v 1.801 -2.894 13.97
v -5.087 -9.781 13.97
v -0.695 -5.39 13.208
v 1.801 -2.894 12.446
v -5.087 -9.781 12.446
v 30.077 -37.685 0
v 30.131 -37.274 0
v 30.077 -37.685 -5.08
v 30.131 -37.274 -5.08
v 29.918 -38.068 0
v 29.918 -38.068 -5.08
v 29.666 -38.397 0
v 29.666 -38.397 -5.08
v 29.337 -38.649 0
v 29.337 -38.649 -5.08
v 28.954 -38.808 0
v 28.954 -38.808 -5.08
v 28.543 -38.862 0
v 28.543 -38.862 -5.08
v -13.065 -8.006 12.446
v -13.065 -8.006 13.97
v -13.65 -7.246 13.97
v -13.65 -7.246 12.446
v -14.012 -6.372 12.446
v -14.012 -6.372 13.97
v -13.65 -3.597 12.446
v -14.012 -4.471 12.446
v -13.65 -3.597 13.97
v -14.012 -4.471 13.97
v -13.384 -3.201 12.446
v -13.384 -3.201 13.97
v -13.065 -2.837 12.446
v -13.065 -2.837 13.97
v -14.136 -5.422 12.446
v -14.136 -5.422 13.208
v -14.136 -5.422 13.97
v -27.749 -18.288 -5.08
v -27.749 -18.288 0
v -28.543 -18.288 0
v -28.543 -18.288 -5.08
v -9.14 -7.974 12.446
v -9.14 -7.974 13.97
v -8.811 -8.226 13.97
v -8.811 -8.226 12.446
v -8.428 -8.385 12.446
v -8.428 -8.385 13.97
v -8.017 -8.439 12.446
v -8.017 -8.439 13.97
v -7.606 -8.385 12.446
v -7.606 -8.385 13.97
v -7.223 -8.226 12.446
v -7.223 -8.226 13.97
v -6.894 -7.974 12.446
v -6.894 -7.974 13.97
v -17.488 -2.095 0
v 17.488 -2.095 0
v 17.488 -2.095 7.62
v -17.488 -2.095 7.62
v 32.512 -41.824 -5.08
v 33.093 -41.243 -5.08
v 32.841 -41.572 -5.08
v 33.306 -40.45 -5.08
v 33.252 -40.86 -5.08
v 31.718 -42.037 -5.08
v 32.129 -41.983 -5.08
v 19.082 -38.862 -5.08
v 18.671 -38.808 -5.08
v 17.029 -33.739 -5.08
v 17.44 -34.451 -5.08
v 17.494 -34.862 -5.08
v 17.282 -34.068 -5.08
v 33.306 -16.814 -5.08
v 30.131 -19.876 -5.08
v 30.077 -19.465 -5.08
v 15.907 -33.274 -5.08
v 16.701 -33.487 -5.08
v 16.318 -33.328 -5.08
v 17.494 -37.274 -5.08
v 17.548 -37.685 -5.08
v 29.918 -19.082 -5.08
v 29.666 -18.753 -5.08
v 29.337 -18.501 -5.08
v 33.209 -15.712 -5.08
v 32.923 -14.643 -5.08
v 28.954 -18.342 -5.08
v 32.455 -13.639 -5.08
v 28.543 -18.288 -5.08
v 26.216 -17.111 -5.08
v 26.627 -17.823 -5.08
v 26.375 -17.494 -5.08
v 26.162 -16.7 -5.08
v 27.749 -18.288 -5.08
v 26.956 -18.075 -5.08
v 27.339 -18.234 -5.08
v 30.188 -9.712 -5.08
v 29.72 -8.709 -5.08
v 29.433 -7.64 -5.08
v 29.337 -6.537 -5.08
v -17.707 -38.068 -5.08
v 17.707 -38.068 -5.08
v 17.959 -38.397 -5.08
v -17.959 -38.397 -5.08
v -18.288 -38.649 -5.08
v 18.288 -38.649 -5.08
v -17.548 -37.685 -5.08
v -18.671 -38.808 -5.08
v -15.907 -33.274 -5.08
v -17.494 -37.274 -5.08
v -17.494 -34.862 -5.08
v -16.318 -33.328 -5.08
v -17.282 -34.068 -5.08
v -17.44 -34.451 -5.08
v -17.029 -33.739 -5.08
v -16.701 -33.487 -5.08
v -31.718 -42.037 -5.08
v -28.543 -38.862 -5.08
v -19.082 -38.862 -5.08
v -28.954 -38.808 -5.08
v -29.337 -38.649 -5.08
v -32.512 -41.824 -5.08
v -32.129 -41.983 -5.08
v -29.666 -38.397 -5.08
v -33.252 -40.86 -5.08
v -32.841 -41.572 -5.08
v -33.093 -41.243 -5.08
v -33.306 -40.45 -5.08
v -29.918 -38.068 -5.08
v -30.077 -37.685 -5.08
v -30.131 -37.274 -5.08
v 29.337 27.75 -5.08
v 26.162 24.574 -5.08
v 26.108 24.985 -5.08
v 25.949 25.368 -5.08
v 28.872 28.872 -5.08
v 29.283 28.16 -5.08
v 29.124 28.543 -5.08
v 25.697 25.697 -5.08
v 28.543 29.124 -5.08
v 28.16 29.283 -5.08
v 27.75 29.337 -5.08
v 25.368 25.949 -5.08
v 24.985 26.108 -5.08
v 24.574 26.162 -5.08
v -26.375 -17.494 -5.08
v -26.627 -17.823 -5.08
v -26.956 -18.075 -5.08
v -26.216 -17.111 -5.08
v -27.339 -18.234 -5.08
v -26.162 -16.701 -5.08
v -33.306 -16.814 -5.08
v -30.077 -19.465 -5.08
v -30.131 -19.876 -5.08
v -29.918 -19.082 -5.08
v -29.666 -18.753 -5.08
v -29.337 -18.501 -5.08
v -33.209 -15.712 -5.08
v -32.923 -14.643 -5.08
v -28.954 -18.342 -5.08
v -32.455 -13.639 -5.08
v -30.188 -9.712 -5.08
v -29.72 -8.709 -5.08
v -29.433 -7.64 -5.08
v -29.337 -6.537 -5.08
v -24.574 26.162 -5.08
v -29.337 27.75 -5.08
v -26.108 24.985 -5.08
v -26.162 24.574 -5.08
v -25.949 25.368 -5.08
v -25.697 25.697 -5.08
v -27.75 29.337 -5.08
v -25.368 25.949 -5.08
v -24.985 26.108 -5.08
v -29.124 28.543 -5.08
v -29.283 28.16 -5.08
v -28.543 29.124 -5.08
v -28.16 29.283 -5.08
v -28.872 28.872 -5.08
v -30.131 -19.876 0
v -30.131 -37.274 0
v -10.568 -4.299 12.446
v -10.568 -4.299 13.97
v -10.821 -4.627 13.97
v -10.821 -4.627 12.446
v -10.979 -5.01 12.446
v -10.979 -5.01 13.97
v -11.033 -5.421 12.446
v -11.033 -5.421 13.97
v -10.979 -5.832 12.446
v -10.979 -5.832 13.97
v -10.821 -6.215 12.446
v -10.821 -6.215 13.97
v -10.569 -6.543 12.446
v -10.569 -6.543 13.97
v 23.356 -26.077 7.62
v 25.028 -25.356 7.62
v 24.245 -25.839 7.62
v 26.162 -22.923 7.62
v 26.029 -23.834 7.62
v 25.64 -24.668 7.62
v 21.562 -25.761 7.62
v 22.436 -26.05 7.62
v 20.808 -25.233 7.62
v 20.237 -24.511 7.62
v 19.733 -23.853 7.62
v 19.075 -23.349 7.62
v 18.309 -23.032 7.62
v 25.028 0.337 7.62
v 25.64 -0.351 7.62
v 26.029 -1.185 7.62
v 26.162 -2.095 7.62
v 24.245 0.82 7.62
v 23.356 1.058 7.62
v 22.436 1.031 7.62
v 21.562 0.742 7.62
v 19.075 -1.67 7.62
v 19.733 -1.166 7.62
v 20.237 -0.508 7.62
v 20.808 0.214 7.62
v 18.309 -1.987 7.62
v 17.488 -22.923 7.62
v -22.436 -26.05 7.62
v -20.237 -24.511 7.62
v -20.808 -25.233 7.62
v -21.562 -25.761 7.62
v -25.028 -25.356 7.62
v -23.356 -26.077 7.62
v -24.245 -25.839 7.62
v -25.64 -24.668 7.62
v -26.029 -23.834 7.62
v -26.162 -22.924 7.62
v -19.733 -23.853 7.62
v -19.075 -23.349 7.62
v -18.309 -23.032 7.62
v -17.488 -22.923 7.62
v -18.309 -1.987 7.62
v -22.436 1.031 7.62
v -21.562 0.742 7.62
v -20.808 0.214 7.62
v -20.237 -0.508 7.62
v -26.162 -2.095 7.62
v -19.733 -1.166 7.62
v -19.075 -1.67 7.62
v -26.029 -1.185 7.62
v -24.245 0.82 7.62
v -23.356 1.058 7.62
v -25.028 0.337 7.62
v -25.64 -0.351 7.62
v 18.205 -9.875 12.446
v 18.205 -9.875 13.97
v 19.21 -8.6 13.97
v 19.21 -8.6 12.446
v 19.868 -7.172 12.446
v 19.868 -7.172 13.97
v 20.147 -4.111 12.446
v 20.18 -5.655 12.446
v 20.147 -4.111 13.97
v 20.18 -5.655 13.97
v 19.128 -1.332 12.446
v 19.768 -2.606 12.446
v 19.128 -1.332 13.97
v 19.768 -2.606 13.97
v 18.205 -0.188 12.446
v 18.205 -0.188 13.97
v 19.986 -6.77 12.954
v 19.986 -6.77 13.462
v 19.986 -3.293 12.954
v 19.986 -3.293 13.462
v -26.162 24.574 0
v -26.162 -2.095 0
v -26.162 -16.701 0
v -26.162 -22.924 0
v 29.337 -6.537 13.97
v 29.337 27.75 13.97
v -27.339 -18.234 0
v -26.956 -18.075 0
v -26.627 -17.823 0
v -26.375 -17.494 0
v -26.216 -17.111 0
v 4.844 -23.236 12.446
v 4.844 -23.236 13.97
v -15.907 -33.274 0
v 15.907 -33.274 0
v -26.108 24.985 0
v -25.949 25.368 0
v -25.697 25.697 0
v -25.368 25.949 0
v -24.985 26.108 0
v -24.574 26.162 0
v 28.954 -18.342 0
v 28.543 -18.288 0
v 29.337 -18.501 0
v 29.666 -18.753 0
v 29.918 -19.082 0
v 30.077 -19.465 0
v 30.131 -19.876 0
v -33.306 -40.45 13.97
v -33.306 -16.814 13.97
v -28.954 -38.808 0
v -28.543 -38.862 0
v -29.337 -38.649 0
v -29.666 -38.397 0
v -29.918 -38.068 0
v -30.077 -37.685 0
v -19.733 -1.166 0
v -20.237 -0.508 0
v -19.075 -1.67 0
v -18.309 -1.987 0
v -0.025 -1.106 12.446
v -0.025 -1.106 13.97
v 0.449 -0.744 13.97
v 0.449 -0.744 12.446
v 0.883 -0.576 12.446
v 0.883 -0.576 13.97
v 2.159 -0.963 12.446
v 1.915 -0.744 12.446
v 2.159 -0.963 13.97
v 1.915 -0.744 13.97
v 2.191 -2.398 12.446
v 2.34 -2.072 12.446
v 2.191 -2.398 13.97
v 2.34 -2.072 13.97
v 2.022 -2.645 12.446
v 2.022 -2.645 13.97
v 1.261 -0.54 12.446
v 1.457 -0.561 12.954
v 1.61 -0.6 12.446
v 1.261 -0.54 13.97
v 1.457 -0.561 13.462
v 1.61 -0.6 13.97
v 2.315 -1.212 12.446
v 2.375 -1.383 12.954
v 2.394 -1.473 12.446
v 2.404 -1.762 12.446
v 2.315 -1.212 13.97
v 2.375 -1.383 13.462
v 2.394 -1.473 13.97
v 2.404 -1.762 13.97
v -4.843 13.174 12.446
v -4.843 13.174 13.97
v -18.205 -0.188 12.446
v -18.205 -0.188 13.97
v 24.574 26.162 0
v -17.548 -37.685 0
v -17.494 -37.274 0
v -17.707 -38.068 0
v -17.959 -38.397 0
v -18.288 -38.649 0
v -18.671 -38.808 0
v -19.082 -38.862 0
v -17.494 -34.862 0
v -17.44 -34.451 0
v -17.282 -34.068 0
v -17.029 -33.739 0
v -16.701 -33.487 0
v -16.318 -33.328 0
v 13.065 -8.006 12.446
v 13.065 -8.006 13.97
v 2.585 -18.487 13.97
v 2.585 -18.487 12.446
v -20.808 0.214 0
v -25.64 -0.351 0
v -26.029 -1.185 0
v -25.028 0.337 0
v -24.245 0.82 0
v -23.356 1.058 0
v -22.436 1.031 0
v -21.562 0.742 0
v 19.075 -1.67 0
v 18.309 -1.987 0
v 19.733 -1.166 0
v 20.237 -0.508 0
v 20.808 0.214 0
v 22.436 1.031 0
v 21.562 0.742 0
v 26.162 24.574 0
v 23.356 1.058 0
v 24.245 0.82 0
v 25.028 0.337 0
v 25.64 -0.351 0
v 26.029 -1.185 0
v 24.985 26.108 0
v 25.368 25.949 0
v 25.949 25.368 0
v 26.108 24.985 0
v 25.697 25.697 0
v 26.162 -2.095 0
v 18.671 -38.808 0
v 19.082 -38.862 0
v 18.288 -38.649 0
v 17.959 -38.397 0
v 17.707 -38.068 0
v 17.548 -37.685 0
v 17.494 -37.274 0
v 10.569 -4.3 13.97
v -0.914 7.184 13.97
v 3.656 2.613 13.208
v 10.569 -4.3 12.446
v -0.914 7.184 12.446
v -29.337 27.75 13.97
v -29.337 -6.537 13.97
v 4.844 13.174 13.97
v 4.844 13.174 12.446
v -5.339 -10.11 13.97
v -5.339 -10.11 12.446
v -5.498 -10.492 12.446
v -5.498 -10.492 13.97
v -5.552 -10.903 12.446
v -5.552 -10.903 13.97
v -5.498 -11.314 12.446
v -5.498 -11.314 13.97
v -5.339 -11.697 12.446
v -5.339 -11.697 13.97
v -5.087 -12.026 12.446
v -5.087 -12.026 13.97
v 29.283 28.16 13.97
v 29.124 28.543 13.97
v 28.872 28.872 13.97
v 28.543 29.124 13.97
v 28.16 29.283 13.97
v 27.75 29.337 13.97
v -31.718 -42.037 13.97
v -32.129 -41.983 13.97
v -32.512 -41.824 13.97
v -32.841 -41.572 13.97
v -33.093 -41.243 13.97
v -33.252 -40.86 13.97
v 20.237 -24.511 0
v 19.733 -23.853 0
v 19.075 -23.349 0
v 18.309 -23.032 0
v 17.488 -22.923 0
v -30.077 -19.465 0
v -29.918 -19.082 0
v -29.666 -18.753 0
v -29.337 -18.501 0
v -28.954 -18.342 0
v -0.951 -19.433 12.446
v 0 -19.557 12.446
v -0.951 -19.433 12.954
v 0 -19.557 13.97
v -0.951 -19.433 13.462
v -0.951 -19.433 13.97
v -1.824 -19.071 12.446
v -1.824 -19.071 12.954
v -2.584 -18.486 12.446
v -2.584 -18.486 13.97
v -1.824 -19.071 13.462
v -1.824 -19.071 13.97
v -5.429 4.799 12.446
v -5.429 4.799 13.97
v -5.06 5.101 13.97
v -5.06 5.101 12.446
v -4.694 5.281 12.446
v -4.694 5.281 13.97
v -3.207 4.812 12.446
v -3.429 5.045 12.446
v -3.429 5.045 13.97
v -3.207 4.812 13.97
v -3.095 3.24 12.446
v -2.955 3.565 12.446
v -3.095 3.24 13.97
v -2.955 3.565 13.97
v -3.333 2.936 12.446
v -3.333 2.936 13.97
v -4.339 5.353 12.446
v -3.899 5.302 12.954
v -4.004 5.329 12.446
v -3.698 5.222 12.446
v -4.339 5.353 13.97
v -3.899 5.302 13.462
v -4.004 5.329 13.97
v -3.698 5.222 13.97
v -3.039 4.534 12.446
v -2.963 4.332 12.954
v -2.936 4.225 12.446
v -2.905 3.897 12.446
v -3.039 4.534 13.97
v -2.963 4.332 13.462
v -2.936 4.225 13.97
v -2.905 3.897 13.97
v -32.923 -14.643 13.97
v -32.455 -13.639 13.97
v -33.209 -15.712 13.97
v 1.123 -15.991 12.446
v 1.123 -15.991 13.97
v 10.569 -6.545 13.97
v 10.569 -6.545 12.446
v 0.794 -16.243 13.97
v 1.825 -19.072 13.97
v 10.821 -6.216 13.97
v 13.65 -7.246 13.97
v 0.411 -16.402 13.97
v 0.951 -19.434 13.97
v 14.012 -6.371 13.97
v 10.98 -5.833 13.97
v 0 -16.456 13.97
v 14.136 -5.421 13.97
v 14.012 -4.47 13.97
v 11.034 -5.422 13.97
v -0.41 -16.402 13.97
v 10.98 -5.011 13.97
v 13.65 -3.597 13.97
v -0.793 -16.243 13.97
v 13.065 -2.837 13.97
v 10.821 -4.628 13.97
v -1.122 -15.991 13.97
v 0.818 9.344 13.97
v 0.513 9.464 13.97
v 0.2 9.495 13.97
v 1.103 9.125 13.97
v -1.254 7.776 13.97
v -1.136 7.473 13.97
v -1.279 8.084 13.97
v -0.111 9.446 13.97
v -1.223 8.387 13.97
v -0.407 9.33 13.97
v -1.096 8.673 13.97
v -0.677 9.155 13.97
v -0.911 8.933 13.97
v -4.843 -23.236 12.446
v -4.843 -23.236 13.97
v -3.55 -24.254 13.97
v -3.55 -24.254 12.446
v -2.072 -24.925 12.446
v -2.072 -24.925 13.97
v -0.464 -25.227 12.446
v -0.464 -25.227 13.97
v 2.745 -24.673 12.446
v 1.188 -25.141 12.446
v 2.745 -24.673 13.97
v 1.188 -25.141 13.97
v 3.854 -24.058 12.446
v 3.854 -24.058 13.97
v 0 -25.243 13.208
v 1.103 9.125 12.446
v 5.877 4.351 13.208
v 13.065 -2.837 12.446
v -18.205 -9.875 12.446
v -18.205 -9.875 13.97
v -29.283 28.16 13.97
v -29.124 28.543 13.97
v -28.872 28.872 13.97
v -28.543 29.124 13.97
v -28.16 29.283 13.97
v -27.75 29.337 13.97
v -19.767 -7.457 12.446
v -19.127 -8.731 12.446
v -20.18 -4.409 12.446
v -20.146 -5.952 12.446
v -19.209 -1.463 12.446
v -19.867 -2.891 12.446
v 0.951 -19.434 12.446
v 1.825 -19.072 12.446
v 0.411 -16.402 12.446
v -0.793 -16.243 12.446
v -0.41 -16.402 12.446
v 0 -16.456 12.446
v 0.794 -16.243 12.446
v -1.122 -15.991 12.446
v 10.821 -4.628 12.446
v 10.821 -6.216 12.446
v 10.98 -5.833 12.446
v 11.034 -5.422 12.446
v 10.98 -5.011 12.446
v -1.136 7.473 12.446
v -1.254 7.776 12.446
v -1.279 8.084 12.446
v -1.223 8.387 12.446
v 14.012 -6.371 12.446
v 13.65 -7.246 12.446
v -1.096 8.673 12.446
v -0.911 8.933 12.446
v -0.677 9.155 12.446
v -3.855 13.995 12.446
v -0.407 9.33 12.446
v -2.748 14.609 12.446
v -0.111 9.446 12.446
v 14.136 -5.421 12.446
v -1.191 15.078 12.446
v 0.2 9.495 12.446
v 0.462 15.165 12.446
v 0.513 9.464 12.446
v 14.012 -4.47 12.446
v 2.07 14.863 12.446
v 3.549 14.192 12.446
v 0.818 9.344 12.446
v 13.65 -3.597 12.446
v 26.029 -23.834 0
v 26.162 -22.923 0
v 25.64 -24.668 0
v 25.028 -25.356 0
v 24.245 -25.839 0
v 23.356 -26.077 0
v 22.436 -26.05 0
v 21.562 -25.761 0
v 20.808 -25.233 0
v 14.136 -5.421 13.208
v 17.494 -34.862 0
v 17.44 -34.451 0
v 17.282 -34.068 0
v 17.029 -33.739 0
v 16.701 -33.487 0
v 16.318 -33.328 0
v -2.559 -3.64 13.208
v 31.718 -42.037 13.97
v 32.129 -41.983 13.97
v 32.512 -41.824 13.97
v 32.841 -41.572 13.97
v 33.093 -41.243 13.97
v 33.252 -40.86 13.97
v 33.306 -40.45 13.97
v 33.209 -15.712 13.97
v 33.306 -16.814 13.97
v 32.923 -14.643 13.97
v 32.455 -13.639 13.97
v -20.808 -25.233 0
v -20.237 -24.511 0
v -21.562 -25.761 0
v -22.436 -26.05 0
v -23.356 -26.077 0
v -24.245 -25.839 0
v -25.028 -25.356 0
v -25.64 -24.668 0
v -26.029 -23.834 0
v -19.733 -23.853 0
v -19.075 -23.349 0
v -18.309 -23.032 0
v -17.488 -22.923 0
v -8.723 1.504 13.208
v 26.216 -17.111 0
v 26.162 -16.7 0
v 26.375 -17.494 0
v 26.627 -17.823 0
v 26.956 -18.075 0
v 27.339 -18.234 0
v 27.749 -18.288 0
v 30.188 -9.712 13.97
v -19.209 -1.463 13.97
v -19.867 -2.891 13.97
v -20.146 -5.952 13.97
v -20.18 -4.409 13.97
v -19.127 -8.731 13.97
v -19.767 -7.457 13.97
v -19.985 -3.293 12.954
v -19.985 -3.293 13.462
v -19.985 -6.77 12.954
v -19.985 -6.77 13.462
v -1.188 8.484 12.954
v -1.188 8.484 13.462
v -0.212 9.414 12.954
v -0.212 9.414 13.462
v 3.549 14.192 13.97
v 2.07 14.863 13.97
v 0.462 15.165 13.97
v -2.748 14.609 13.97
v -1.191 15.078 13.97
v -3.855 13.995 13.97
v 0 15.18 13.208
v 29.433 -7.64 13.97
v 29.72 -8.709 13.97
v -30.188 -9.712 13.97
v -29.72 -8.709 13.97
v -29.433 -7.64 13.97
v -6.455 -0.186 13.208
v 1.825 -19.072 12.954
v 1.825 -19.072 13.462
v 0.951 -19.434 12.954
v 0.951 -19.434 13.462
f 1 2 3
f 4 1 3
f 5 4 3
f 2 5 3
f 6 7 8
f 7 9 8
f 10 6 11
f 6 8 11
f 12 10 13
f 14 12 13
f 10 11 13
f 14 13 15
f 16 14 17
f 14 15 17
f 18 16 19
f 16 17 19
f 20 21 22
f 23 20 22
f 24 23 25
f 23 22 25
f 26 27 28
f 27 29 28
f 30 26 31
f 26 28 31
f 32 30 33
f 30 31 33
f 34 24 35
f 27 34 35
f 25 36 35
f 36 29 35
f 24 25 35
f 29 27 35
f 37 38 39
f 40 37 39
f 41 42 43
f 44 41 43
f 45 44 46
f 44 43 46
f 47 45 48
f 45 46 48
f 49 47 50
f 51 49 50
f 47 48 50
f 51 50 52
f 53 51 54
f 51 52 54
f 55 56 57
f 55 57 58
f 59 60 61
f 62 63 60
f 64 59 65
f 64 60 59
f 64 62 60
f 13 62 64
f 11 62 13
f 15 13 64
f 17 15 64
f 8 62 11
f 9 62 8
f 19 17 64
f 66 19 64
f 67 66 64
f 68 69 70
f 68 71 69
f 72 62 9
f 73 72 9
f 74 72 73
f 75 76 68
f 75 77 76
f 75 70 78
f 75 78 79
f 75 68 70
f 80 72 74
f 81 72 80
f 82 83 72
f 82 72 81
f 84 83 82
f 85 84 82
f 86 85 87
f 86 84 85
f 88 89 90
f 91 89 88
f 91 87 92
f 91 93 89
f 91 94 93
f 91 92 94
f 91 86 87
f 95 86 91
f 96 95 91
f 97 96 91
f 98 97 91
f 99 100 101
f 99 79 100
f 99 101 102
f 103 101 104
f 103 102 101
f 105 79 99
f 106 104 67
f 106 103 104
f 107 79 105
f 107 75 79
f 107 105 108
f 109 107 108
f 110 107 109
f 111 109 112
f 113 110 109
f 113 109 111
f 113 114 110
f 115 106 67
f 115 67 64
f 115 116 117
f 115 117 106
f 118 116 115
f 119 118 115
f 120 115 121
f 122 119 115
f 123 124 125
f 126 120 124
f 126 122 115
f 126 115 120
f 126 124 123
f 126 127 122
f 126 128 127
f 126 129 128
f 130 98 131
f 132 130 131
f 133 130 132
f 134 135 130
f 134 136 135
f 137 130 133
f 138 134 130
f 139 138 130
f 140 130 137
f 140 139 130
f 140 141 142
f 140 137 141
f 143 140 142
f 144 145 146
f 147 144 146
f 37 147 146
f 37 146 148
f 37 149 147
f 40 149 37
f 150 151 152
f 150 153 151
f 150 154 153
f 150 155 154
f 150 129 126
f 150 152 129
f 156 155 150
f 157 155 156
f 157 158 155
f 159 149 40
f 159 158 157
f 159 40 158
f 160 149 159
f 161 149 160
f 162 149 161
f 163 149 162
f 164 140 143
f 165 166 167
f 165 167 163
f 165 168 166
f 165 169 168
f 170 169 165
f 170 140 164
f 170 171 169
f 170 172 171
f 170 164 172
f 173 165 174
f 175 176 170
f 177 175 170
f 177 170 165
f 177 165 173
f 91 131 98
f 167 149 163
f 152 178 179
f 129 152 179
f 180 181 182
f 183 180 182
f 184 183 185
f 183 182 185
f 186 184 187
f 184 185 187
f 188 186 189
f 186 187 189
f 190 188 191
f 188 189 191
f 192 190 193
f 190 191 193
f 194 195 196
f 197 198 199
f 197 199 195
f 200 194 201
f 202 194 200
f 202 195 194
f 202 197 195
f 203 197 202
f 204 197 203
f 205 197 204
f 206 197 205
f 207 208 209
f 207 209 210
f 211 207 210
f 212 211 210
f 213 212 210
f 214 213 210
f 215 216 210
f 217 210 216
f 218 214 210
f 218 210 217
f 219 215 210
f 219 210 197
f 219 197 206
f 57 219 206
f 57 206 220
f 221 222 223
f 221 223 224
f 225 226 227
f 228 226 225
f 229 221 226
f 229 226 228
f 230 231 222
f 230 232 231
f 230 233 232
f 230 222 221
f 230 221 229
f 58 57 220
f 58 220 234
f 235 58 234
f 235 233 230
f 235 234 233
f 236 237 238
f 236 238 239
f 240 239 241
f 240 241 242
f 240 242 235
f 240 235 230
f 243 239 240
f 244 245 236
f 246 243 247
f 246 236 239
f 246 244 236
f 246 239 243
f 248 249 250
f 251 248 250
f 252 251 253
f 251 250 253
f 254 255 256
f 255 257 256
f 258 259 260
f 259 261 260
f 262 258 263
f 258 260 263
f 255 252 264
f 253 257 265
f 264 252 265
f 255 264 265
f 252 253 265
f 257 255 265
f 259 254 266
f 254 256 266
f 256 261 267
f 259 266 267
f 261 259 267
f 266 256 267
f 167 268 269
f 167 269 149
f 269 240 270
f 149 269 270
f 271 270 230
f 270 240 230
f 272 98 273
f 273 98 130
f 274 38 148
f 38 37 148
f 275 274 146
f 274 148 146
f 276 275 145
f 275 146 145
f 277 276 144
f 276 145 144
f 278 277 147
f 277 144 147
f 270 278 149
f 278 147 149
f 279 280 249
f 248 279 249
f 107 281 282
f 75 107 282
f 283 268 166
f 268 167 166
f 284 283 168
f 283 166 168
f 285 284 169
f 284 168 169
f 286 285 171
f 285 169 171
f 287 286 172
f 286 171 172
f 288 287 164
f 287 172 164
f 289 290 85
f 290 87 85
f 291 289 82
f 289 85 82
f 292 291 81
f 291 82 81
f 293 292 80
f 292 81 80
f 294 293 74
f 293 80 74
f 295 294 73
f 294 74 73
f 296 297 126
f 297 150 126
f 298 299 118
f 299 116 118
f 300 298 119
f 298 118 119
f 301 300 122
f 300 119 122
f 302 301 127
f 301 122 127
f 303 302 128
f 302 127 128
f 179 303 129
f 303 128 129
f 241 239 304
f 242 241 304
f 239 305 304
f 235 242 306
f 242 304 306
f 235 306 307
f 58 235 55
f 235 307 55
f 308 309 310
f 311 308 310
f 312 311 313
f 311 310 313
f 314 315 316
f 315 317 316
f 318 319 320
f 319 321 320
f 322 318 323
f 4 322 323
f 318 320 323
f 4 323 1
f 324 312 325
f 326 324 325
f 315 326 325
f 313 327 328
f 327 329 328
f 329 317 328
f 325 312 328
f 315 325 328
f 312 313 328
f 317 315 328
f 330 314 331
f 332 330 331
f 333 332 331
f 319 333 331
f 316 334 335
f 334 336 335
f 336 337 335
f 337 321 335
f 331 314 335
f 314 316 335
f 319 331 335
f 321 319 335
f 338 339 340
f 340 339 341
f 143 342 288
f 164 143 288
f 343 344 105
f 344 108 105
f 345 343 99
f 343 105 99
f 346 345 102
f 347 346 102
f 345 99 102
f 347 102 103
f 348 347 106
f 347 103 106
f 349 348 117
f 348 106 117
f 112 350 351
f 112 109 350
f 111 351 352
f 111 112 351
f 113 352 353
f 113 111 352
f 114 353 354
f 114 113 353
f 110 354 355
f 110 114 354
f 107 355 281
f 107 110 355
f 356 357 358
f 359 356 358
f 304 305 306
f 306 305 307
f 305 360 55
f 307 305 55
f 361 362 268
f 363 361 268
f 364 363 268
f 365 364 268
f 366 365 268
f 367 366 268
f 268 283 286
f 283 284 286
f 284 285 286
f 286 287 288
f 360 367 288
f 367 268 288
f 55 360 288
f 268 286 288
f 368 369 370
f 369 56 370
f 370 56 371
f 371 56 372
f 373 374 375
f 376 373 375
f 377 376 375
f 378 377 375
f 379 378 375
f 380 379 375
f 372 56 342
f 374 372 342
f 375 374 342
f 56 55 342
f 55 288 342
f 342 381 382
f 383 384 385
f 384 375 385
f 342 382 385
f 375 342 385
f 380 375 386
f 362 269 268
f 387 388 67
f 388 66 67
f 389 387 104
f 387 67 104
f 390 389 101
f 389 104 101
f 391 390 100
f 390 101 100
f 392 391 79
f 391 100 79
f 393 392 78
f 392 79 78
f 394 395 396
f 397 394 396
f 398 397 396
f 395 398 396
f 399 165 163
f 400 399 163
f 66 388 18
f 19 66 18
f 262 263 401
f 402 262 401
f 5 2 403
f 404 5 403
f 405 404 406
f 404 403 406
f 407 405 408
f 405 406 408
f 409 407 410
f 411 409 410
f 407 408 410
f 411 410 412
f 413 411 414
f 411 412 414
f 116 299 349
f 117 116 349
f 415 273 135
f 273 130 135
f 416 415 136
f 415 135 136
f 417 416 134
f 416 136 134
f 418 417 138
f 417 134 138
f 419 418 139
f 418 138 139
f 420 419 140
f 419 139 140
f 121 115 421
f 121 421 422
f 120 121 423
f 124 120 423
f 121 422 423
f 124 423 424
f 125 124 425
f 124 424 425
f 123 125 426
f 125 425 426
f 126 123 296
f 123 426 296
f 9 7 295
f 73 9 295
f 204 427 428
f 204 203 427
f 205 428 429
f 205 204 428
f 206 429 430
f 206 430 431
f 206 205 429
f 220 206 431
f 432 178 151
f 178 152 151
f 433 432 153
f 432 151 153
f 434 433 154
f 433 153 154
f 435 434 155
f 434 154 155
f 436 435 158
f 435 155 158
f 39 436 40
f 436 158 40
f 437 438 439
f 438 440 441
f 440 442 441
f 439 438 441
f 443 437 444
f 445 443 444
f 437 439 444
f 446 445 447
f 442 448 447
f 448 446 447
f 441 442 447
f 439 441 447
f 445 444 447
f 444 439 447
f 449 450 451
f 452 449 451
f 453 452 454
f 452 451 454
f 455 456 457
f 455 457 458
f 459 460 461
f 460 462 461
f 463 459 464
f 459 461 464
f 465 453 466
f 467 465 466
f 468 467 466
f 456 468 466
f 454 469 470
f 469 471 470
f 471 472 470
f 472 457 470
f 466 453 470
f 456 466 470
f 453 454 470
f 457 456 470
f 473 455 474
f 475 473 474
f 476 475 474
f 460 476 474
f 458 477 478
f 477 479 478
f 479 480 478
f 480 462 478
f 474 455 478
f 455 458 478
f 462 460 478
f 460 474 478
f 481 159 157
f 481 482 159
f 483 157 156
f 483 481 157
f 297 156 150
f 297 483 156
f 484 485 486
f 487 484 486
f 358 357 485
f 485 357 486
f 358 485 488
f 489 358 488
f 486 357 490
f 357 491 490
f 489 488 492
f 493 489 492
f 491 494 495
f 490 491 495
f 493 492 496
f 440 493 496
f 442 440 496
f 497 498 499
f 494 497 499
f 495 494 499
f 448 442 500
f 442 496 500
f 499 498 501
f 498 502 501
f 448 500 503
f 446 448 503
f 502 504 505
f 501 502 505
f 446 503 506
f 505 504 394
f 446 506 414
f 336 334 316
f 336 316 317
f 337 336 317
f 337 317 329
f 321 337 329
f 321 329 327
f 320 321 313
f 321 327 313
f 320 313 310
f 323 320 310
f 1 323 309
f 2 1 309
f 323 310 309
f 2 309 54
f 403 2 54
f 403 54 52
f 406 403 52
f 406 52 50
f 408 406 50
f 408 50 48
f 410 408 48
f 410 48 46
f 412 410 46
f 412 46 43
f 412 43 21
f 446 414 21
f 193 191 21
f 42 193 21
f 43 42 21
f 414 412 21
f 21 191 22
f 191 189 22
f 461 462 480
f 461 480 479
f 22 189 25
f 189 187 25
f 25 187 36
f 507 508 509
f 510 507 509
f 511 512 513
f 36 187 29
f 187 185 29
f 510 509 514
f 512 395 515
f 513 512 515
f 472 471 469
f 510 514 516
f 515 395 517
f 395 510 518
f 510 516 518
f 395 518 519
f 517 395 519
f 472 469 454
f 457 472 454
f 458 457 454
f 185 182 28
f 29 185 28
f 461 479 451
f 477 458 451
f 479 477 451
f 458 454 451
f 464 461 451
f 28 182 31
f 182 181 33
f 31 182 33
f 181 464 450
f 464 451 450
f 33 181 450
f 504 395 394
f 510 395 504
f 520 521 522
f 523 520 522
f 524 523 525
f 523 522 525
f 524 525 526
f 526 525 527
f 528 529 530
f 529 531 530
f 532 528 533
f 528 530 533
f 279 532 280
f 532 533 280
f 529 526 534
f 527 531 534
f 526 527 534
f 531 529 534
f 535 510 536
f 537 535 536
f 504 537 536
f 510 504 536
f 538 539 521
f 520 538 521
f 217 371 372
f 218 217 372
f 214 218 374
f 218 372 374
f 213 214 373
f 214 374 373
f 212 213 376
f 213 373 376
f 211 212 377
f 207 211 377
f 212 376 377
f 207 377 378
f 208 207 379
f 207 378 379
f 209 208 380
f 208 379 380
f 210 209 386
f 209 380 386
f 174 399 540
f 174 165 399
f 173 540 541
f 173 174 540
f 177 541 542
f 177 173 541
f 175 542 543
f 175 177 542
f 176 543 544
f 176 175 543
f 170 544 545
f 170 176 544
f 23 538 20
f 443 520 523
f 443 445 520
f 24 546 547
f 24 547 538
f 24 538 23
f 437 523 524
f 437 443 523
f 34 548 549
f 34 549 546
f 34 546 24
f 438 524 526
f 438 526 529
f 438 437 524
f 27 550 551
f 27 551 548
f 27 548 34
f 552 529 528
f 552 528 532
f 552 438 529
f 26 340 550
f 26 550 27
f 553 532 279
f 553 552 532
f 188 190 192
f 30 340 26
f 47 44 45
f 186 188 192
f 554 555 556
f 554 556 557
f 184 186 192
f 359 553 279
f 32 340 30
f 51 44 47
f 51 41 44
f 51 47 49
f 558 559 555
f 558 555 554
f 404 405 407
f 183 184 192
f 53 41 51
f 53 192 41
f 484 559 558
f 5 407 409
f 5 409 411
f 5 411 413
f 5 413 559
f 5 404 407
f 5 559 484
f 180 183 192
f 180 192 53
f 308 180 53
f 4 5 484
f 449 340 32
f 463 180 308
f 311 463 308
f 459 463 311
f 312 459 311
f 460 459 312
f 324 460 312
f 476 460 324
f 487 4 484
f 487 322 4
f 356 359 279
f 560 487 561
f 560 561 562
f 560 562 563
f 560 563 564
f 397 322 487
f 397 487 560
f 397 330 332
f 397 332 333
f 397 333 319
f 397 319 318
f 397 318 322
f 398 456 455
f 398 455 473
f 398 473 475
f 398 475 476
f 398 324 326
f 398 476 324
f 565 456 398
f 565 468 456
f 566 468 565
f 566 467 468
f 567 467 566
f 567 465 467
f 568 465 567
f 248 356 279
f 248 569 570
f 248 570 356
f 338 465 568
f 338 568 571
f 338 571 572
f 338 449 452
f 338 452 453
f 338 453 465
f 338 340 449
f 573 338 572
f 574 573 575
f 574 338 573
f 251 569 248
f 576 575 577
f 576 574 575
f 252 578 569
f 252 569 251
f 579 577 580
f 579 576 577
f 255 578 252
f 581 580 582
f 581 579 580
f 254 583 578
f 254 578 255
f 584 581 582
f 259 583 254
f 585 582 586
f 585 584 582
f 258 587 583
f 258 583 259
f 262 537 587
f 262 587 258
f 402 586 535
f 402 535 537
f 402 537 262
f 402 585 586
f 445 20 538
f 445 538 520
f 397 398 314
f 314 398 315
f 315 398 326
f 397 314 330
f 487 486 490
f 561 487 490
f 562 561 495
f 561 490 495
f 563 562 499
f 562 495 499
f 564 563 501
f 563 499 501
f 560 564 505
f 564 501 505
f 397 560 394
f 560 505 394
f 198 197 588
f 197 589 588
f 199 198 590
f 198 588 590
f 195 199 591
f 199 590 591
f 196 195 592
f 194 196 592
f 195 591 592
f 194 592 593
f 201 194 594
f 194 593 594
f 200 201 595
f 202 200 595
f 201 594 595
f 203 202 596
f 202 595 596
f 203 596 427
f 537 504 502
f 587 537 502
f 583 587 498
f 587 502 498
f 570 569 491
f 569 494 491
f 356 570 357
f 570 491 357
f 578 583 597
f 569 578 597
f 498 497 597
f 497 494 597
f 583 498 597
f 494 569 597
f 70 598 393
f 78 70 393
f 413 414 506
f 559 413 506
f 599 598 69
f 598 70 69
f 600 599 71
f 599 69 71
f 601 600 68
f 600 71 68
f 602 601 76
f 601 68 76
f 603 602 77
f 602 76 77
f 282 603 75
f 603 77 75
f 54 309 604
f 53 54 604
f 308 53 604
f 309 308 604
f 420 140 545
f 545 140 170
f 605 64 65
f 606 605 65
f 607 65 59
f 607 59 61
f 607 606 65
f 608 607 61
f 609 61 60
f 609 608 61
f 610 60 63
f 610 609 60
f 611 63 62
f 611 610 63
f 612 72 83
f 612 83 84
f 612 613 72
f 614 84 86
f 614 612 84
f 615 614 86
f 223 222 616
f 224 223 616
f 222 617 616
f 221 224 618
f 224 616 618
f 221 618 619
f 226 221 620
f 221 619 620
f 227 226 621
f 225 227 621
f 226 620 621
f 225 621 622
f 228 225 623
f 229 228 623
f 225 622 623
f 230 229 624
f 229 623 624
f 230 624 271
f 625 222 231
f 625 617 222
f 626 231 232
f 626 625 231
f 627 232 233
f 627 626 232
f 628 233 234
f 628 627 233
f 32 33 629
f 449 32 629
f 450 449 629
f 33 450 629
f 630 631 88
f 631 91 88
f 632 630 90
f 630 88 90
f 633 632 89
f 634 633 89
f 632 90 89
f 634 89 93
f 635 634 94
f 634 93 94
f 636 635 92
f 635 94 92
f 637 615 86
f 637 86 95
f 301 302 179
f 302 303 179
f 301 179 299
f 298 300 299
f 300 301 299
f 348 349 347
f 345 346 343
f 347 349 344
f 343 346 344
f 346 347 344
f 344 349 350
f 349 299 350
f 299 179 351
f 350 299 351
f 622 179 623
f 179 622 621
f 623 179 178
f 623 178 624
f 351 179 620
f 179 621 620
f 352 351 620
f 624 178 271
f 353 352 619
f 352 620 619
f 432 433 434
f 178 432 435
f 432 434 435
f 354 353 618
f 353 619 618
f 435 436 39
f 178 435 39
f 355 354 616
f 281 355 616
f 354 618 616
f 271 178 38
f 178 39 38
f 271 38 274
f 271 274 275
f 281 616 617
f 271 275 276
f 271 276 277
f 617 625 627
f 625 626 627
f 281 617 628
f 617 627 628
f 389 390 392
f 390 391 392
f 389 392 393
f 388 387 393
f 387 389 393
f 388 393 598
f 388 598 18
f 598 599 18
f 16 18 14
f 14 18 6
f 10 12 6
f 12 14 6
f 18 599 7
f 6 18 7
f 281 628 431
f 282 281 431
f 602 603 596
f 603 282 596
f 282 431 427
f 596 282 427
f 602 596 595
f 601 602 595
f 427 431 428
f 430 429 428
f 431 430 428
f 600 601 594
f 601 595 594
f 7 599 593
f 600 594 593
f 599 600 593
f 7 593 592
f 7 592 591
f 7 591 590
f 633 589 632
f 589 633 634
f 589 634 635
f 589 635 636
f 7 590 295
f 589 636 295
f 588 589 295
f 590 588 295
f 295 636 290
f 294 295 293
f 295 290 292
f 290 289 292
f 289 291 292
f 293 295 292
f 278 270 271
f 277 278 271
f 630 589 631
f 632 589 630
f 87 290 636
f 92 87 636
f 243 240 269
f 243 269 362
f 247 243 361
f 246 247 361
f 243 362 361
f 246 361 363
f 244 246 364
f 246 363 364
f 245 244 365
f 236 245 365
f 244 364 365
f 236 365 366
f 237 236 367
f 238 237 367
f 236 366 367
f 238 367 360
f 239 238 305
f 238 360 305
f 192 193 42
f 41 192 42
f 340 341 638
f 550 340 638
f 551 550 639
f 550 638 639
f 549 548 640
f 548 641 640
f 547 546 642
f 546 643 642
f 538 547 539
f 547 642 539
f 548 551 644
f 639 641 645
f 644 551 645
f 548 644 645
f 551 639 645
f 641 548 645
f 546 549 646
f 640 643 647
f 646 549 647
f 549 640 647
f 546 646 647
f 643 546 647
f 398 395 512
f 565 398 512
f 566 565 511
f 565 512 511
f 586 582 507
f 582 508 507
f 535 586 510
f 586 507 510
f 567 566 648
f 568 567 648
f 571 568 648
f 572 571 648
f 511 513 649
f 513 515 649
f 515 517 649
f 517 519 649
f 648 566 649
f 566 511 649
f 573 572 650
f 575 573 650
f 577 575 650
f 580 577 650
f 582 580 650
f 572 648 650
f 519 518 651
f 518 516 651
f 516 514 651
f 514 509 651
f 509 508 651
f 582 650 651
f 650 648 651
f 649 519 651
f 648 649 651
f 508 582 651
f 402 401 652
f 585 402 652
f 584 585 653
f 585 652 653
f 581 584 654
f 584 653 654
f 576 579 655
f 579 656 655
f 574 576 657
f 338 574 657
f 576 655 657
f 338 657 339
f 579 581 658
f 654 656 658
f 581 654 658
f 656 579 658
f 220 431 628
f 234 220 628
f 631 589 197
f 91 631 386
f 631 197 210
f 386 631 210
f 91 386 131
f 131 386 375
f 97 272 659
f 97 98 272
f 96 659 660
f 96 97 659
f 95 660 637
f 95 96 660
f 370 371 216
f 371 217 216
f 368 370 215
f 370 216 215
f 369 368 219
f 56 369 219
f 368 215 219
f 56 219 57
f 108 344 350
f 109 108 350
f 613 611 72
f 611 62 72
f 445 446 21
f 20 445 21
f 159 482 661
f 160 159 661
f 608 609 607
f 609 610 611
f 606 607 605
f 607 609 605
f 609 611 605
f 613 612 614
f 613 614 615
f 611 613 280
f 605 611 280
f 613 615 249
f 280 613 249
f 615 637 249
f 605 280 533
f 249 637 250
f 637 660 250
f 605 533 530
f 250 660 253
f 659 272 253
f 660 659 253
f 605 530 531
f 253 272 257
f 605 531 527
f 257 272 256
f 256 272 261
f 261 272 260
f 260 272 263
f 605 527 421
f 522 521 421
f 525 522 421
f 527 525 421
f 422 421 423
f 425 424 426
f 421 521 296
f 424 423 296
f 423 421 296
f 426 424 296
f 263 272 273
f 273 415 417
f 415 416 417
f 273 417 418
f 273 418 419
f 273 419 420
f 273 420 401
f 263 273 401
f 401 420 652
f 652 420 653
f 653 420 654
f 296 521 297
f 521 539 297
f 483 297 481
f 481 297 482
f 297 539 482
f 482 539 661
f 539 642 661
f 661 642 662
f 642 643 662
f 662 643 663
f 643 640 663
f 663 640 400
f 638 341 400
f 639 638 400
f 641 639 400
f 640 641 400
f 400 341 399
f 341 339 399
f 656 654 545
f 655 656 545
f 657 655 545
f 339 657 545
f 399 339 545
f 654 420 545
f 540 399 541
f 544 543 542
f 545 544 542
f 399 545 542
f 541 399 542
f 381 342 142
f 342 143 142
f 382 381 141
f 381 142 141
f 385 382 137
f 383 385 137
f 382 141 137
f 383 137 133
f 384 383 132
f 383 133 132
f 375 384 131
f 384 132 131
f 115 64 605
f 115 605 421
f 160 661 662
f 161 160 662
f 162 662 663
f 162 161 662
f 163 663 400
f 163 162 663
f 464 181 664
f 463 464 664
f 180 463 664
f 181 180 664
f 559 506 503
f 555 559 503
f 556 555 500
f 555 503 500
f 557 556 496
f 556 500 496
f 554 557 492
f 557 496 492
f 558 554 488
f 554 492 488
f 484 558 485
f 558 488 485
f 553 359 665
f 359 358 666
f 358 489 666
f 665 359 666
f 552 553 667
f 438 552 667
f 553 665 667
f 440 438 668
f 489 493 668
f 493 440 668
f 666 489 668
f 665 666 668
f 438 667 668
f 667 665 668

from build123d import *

# Parameters (mm, degrees)
OVERLAP_PROFILE_DEPTH              = 5.08
END_THICKNESS_DEPTH                = 13.97
FILLET1_R                          = 1.5875
FILLET2_R                          = 1.5875
SKETCH7_W                          = 28.6385
SKETCH7_H                          = 5.588
BOTTOM_FILL_DEPTH                  = 19.05
LOGO_INLAY_CUTOUT_DEPTH            = 1.524
SIDE_TRANSITION_FILL_DEPTH         = 19.05
SKETCH8_W                          = 52.324
SKETCH8_H                          = 20.828
MAGNETIC_CATCH_CUTOUT_DEPTH        = 7.62
FILLET3_R                          = 6.35
FILLET4_R                          = 6.35
SKETCH10_R                         = 3.175
ROUTER_BIT_RELIEF_DEPTH            = 7.62
FILLET5_R                          = 3.175
LOGO_FILL_FOR_1_8_ROUTER_BIT_DEPTH = 1.524


with BuildPart() as part:
    # Sketch1 → Overlap Profile (new body)
    with BuildSketch(Plane.XY):
        Polygon((-14.31925, -36.449), (14.31925, -36.449), (14.31925, -42.037), (33.30575, -42.037), (33.30575, -15.113), (29.337, -15.113), (29.337, 29.337), (-29.337, 29.337), (-29.337, -15.113), (-33.30575, -15.113), (-33.30575, -42.037), (-14.31925, -42.037), align=None)
        Polygon((-17.49425, -33.274), (17.49425, -33.274), (17.49425, -38.862), (30.13075, -38.862), (30.13075, -18.288), (26.162, -18.288), (26.162, 26.162), (-26.162, 26.162), (-26.162, -18.288), (-30.13075, -18.288), (-30.13075, -38.862), (-17.49425, -38.862), align=None, mode=Mode.SUBTRACT)
    extrude(amount=-OVERLAP_PROFILE_DEPTH)

    # Sketch2 → End Thickness (add)
    with BuildSketch(Plane.XY):
        Polygon((-29.337, 29.337), (-29.337, -15.113), (-33.30575, -15.113), (-33.30575, -42.037), (-14.31925, -42.037), (-14.31925, -36.449), (14.31925, -36.449), (14.31925, -42.037), (33.30575, -42.037), (33.30575, -15.113), (29.337, -15.113), (29.337, 29.337), align=None)
    extrude(amount=END_THICKNESS_DEPTH)

    # Fillet1
    fillet1_edges = [part.edges().sort_by_distance(p)[0] for p in [
        (17.49425, -38.862, -2.54),
        (17.49425, -33.274, -2.54),
        (-17.49425, -33.274, -2.54),
        (-17.49425, -38.862, -2.54),
        (-30.13075, -38.862, -2.54),
        (-30.13075, -18.288, -2.54),
        (-26.162, -18.288, -2.54),
        (-26.162, 26.162, -2.54),
        (26.162, 26.162, -2.54),
        (26.162, -18.288, -2.54),
        (30.13075, -18.288, -2.54),
        (30.13075, -38.862, -2.54),
    ]]
    fillet(fillet1_edges, radius=FILLET1_R)

    # Fillet2
    fillet2_edges = [part.edges().sort_by_distance(p)[0] for p in [
        (-33.30575, -42.037, 4.445),
        (-29.337, 29.337, 4.445),
        (29.337, 29.337, 4.445),
        (33.30575, -42.037, 4.445),
    ]]
    fillet(fillet2_edges, radius=FILLET2_R)

    # Sketch7 → Bottom Fill (add)
    with BuildSketch(Plane(origin=(0, 0, -5.08), x_dir=(-1, 0, 0), z_dir=(0, 0, -1))):
        with Locations((0, -39.243)):
            Rectangle(SKETCH7_W, SKETCH7_H)
    extrude(amount=-BOTTOM_FILL_DEPTH)

    # Sketch5 → Logo Inlay Cutout (cut)
    with BuildSketch(Plane.XY.offset(13.97)):
        with BuildLine():
            Line((18.205177148, -0.187852502), (4.843750234, 13.173642935))
            add(Edge.make_bspline(
                [(4.843750234, 13.173642935), (3.54948877, 14.467561785), (1.829288652, 15.180131934), (0, 15.180131934)],
                knots=[1, 1, 1, 1, 2, 2, 2, 2], degree=3))
            add(Edge.make_bspline(
                [(0, 15.180131934), (-1.829494221, 15.180131934), (-3.549865646, 14.467561785), (-4.843167789, 13.173642935)],
                knots=[2, 2, 2, 2, 3, 3, 3, 3], degree=3))
            Line((-4.843167789, 13.173642935), (-18.205279933, -0.187852502))
            add(Edge.make_bspline(
                [(-18.205279933, -0.187852502), (-20.875413695, -2.858740017), (-20.875413695, -7.203951534), (-18.204868795, -9.874907572)],
                knots=[4, 4, 4, 4, 5, 5, 5, 5], degree=3))
            Line((-18.204868795, -9.874907572), (-4.843167789, -23.236471532))
            add(Edge.make_bspline(
                [(-4.843167789, -23.236471532), (-3.549865646, -24.530321859), (-1.829494221, -25.242892008), (0, -25.242892008)],
                knots=[6, 6, 6, 6, 7, 7, 7, 7], degree=3))
            add(Edge.make_bspline(
                [(0, -25.242892008), (1.829288652, -25.242892008), (3.54948877, -24.530321859), (4.843750234, -23.236471532)],
                knots=[7, 7, 7, 7, 8, 8, 8, 8], degree=3))
            Line((4.843750234, -23.236471532), (18.205177148, -9.874907572))
            add(Edge.make_bspline(
                [(18.205177148, -9.874907572), (20.876475801, -7.203951534), (20.876475801, -2.858740017), (18.205177148, -0.187852502)],
                knots=[9, 9, 9, 9, 10, 10, 10, 10], degree=3))
        make_face()
        with BuildLine():
            Line((13.064585498, -8.006012655), (2.584548599, -18.487145921))
            add(Edge.make_bspline(
                [(2.584548599, -18.487145921), (1.895207729, -19.177583158), (0.977274302, -19.558570755), (0, -19.557474388)],
                knots=[1, 1, 1, 1, 2, 2, 2, 2], degree=3))
            add(Edge.make_bspline(
                [(0, -19.557474388), (-0.976691857, -19.557474388), (-1.893254825, -19.177583158), (-2.584411553, -18.485501371)],
                knots=[2, 2, 2, 2, 3, 3, 3, 3], degree=3))
            Line((-2.584411553, -18.485501371), (-13.06461976, -8.006012655))
            add(Edge.make_bspline(
                [(-13.06461976, -8.006012655), (-13.756016317, -7.315986556), (-14.136010332, -6.398601312), (-14.136010332, -5.421738148)],
                knots=[4, 4, 4, 4, 5, 5, 5, 5], degree=3))
            add(Edge.make_bspline(
                [(-14.136010332, -5.421738148), (-14.136010332, -4.444737938), (-13.755570918, -3.527798093), (-13.06461976, -2.837292334)],
                knots=[5, 5, 5, 5, 6, 6, 6, 6], degree=3))
            add(Edge.make_bspline(
                [(-13.06461976, -2.837292334), (-8.199798718, 2.027700015), (-5.428662129, 4.798768081)],
                knots=[6, 6, 6, 7, 7, 7], degree=2))
            add(Edge.make_bspline(
                [(-5.428662129, 4.798768081), (-3.839306583, 6.387198567), (-2.073024783, 4.195971697), (-3.333264603, 2.936382845)],
                knots=[7, 7, 7, 7, 8, 8, 8, 8], degree=3))
            add(Edge.make_bspline(
                [(-3.333264603, 2.936382845), (-6.104161362, 0.163773012), (-11.086122385, -4.81630363)],
                knots=[8, 8, 8, 9, 9, 9], degree=2))
            add(Edge.make_bspline(
                [(-11.086122385, -4.81630363), (-11.247288362, -4.978428928), (-11.336745072, -5.192871498), (-11.336745072, -5.421738148)],
                knots=[9, 9, 9, 9, 10, 10, 10, 10], degree=3))
            add(Edge.make_bspline(
                [(-11.336745072, -5.421738148), (-11.336059843, -5.650056615), (-11.247288362, -5.865150152), (-11.084991757, -6.026932835)],
                knots=[10, 10, 10, 10, 11, 11, 11, 11], degree=3))
            Line((-11.084991757, -6.026932835), (-8.017356366, -9.096898006))
            add(Edge.make_bspline(
                [(-8.017356366, -9.096898006), (-1.827952455, -2.908933077), (-0.025250707, -1.106128545)],
                knots=[12, 12, 12, 13, 13, 13], degree=2))
            add(Edge.make_bspline(
                [(-0.025250707, -1.106128545), (1.428977583, 0.347551562), (3.4298477, -1.263697066), (1.800783105, -2.893549675)],
                knots=[13, 13, 13, 13, 14, 14, 14, 14], degree=3))
            add(Edge.make_bspline(
                [(1.800783105, -2.893549675), (0.095383945, -4.599394234), (-6.209412612, -10.903299994)],
                knots=[14, 14, 14, 15, 15, 15], degree=2))
            Line((-6.209412612, -10.903299994), (-0.605503041, -16.507449395))
            add(Edge.make_bspline(
                [(-0.605503041, -16.507449395), (-0.443686096, -16.669095033), (-0.228352728, -16.758380436), (0, -16.758380436)],
                knots=[16, 16, 16, 16, 17, 17, 17, 17], degree=3))
            add(Edge.make_bspline(
                [(0, -16.758380436), (0.22955188, -16.758380436), (0.443754619, -16.669780262), (0.606016963, -16.50779201)],
                knots=[17, 17, 17, 17, 18, 18, 18, 18], degree=3))
            Line((0.606016963, -16.50779201), (11.086465, -6.027206927))
            add(Edge.make_bspline(
                [(11.086465, -6.027206927), (11.247630977, -5.865150152), (11.336436719, -5.649371385), (11.336847856, -5.422560423)],
                knots=[19, 19, 19, 19, 20, 20, 20, 20], degree=3))
            add(Edge.make_bspline(
                [(11.336847856, -5.422560423), (11.336847856, -5.192871498), (11.247630977, -4.977675175), (11.085779771, -4.81630363)],
                knots=[20, 20, 20, 20, 21, 21, 21, 21], degree=3))
            add(Edge.make_bspline(
                [(11.085779771, -4.81630363), (2.592908398, 3.67581399), (-0.913993358, 7.184051944)],
                knots=[21, 21, 21, 22, 22, 22], degree=2))
            add(Edge.make_bspline(
                [(-0.913993358, 7.184051944), (-2.11687947, 8.385807427), (-0.0785273, 10.307533538), (1.103356528, 9.124621866)],
                knots=[22, 22, 22, 22, 23, 23, 23, 23], degree=3))
            add(Edge.make_bspline(
                [(1.103356528, 9.124621866), (4.669701943, 5.557831051), (13.064585498, -2.837292334)],
                knots=[23, 23, 23, 24, 24, 24], degree=2))
            add(Edge.make_bspline(
                [(13.064585498, -2.837292334), (13.756393193, -3.527386955), (14.136147378, -4.444737938), (14.136147378, -5.42132701)],
                knots=[24, 24, 24, 24, 25, 25, 25, 25], degree=3))
            add(Edge.make_bspline(
                [(14.136147378, -5.42132701), (14.136147378, -6.397436422), (13.756393193, -7.315986556), (13.064585498, -8.006012655)],
                knots=[25, 25, 25, 25, 26, 26, 26, 26], degree=3))
        make_face(mode=Mode.SUBTRACT)
    extrude(amount=-LOGO_INLAY_CUTOUT_DEPTH, mode=Mode.SUBTRACT)

    # Sketch9 → Side Transition Fill (add)
    with BuildSketch(Plane.XY.offset(13.97)):
        Polygon((-33.30575, -15.113), (-29.337, -8.238923357), (-29.337, -15.113), align=None)
        Polygon((29.337, -15.113), (33.30575, -15.113), (29.337, -8.238923357), align=None)
    extrude(amount=-SIDE_TRANSITION_FILL_DEPTH)

    # Sketch8 → Magnetic Catch Cutout (cut)
    with BuildSketch(Plane(origin=(0, 0, 0), x_dir=(-1, 0, 0), z_dir=(0, 0, -1))):
        with Locations((0, -12.5095)):
            Rectangle(SKETCH8_W, SKETCH8_H)
    extrude(amount=-MAGNETIC_CATCH_CUTOUT_DEPTH, mode=Mode.SUBTRACT)

    # Fillet3
    fillet3_edges = [part.edges().sort_by_distance(p)[0] for p in [
        (-29.337, -8.238923357, 4.445),
        (29.337, -8.238923357, 4.445),
    ]]
    fillet(fillet3_edges, radius=FILLET3_R)

    # Fillet4
    fillet4_edges = [part.edges().sort_by_distance(p)[0] for p in [
        (-33.30575, -15.113, 4.445),
        (33.30575, -15.113, 4.445),
    ]]
    fillet(fillet4_edges, radius=FILLET4_R)

    # Sketch10 → Router Bit Relief (cut)
    with BuildSketch(Plane(origin=(0, 0, 0), x_dir=(-1, 0, 0), z_dir=(0, 0, -1))):
        with Locations((-22.987, -2.0955)):
            Circle(SKETCH10_R)
        with Locations((-22.987, -22.9235)):
            Circle(SKETCH10_R)
        with Locations((22.987, -22.9235)):
            Circle(SKETCH10_R)
        with Locations((22.987, -2.0955)):
            Circle(SKETCH10_R)
    extrude(amount=-ROUTER_BIT_RELIEF_DEPTH, mode=Mode.SUBTRACT)

    # Fillet5
    fillet5_edges = [part.edges().sort_by_distance(p)[0] for p in [
        (-19.812, -2.0955, 3.81),
        (-19.812, -22.9235, 3.81),
        (19.812, -22.9235, 3.81),
        (19.812, -2.0955, 3.81),
    ]]
    fillet(fillet5_edges, radius=FILLET5_R)

    # Sketch15 → Logo Fill for 1/8" Router Bit (add)
    with BuildSketch(Plane.XY.offset(13.97)):
        with BuildLine():
            Line((1.122975297, -15.990826916), (0.606016963, -16.50779201))
            add(Edge.make_bspline(
                [(0.606016963, -16.50779201), (0.443754619, -16.669780262), (0.22955188, -16.758380436), (0, -16.758380436)],
                knots=[17, 17, 17, 17, 18, 18, 18, 18], degree=3))
            add(Edge.make_bspline(
                [(0, -16.758380436), (-0.228352728, -16.758380436), (-0.443686096, -16.669095033), (-0.605503041, -16.507449395)],
                knots=[16, 16, 16, 16, 17, 17, 17, 17], degree=3))
            Line((-0.605503041, -16.507449395), (-1.122120092, -15.990810235))
            ThreePointArc((-1.122120092, -15.990810235), (0.000424148, -16.45580224), (1.122975297, -15.990826916))
        make_face()
        with BuildLine():
            Line((-5.086852244, -12.025908404), (-6.209412612, -10.903299994))
            add(Edge.make_bspline(
                [(-6.209412612, -10.903299994), (-5.628564976, -10.322534425), (-5.086754951, -9.780795126)],
                knots=[14, 14, 14, 14.092127895, 14.092127895, 14.092127895], degree=2))
            ThreePointArc((-5.086754951, -9.780795126), (-5.551796207, -10.903331614), (-5.086852244, -12.025908404))
        make_face()
        with BuildLine():
            Line((-10.568867647, -6.543448927), (-11.084991757, -6.026932835))
            add(Edge.make_bspline(
                [(-11.084991757, -6.026932835), (-11.247288362, -5.865150152), (-11.336059843, -5.650056615), (-11.336745072, -5.421738148)],
                knots=[10, 10, 10, 10, 11, 11, 11, 11], degree=3))
            add(Edge.make_bspline(
                [(-11.336745072, -5.421738148), (-11.336745072, -5.192871498), (-11.247288362, -4.978428928), (-11.086122385, -4.81630363)],
                knots=[9, 9, 9, 9, 10, 10, 10, 10], degree=3))
            add(Edge.make_bspline(
                [(-11.086122385, -4.81630363), (-10.824126761, -4.554407103), (-10.568246029, -4.29861552)],
                knots=[8, 8, 8, 8.052588855, 8.052588855, 8.052588855], degree=2))
            ThreePointArc((-10.568246029, -4.29861552), (-11.033409548, -5.420903501), (-10.568867647, -6.543448927))
        make_face()
        with BuildLine():
            Line((11.086465, -6.027206927), (10.569030585, -6.544648108))
            ThreePointArc((10.569030585, -6.544648108), (11.03399123, -5.422085425), (10.568976834, -4.299545007))
            add(Edge.make_bspline(
                [(10.568976834, -4.299545007), (10.825028323, -4.555575325), (11.085779771, -4.81630363)],
                knots=[21.96929761, 21.96929761, 21.96929761, 22, 22, 22], degree=2))
            add(Edge.make_bspline(
                [(11.085779771, -4.81630363), (11.247630977, -4.977675175), (11.336847856, -5.192871498), (11.336847856, -5.422560423)],
                knots=[20, 20, 20, 20, 21, 21, 21, 21], degree=3))
            add(Edge.make_bspline(
                [(11.336847856, -5.422560423), (11.336436719, -5.649371385), (11.247630977, -5.865150152), (11.086465, -6.027206927)],
                knots=[19, 19, 19, 19, 20, 20, 20, 20], degree=3))
        make_face()
        with BuildLine():
            Line((-8.017356366, -9.096898006), (-9.139760019, -7.97364192))
            ThreePointArc((-9.139760019, -7.97364192), (-8.017192198, -8.439036041), (-6.89439572, -7.974193843))
            add(Edge.make_bspline(
                [(-6.89439572, -7.974193843), (-7.436562853, -8.516239522), (-8.017356366, -9.096898006)],
                knots=[12.906163256, 12.906163256, 12.906163256, 13, 13, 13], degree=2))
        make_face()
    extrude(amount=-LOGO_FILL_FOR_1_8_ROUTER_BIT_DEPTH)


solid = part.part
